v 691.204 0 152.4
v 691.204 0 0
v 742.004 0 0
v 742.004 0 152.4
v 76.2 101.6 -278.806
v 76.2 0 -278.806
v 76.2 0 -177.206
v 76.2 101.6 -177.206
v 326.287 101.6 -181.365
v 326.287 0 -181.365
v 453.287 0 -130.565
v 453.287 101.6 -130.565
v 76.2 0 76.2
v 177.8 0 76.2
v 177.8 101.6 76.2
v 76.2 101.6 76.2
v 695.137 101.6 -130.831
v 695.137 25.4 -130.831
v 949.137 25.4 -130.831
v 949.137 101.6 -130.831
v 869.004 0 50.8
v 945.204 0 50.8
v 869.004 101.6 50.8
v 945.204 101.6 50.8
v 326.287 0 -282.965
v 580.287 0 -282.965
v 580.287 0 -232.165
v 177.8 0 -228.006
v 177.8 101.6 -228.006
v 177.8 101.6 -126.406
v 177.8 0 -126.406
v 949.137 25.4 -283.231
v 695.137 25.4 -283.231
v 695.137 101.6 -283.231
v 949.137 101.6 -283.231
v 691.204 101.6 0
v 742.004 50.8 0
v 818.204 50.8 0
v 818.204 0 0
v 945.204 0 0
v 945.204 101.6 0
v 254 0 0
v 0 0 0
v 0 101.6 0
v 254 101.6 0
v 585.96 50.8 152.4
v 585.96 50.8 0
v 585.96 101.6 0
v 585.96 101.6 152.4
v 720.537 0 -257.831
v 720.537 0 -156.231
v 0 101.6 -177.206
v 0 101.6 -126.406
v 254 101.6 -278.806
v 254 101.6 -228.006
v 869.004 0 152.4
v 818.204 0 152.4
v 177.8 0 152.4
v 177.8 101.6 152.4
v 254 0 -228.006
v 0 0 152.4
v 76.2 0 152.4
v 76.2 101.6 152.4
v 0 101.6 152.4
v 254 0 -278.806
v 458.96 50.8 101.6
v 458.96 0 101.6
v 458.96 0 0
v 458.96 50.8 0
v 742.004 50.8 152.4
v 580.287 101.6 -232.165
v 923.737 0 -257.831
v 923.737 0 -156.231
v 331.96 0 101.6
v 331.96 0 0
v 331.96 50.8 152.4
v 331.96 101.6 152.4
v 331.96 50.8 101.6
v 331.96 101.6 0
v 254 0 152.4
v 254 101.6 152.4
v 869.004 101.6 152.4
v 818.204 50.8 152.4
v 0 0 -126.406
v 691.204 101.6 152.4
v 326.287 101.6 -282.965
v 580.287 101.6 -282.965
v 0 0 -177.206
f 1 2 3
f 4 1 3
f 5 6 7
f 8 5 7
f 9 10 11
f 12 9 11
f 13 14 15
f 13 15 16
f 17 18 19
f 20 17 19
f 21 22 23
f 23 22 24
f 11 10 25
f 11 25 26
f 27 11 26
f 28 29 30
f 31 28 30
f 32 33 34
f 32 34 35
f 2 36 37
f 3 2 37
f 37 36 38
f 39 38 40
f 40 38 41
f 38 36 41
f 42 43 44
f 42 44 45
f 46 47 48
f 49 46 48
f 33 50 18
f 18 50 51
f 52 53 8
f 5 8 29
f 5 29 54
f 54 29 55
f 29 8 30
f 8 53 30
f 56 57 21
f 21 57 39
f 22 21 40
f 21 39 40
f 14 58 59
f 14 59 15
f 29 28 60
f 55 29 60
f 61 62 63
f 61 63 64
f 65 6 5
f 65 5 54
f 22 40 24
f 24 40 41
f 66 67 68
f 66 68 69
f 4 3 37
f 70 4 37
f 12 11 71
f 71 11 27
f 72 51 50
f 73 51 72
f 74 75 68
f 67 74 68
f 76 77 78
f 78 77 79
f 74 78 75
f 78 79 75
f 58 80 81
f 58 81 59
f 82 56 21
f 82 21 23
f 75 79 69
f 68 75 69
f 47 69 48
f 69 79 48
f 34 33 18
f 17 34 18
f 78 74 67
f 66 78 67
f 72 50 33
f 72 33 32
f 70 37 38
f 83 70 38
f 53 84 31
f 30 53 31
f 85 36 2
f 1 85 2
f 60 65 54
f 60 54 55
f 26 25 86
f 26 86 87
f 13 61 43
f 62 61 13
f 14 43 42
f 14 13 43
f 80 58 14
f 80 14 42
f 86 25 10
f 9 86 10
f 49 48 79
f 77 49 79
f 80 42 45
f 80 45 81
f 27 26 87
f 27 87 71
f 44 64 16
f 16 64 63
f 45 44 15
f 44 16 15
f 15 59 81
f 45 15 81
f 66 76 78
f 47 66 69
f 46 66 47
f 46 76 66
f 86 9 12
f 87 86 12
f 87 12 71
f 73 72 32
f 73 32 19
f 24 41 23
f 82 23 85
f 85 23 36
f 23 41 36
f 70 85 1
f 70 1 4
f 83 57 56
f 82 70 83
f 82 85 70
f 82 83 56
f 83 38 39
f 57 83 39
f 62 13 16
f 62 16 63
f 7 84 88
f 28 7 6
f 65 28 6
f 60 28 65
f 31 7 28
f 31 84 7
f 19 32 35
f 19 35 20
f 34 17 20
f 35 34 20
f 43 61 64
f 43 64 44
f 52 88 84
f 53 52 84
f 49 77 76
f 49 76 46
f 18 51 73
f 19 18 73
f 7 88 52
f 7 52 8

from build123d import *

# Parameters (mm, degrees)
F1_DEPTH  = 101.6
F3_DEPTH  = 152.4
F5_DEPTH  = 152.4
F6_W      = 127
F6_H      = 50.8
F7_DEPTH  = 50.8
F8_W      = 101.6
F8_H      = 101.6
F9_DEPTH  = 76.2
F10_W     = 254
F10_H     = 152.4
F11_DEPTH = 101.6
F12_W     = 76.2
F12_H     = 101.6
F13_DEPTH = 101.6
F14_W     = 254
F14_H     = 152.4
F15_DEPTH = 101.6
F17_DEPTH = 101.6
F19_DEPTH = 101.6
F20_W     = 254
F20_H     = 152.4
F21_DEPTH = 101.6
F22_SIZE  = 25.4
F23_SIZE  = 25.4
F24_SIZE  = 25.4
F25_SIZE  = 25.4


with BuildPart() as f1:
    # F0 (on Front) → F1 (new body)
    with BuildSketch(Plane.XZ):
        Polygon((0, 152.4), (0, 0), (254, 0), (254, 152.4), (177.8, 152.4), (177.8, 76.2), (76.2, 76.2), (76.2, 152.4), align=None)
    extrude(amount=-F1_DEPTH)


with BuildPart() as f3:
    # F2 (on Top) → F3 (new body)
    with BuildSketch(Plane.XY):
        Polygon((331.959809, 101.6), (331.959809, 0), (458.959809, 0), (458.959809, 50.8), (585.959809, 50.8), (585.959809, 101.6), align=None)
    extrude(amount=F3_DEPTH)

    # F6 (on face) → F7 (cut)
    with BuildSketch(Plane.XZ):
        with Locations((395.459809, 127)):
            Rectangle(F6_W, F6_H)
    extrude(amount=-F7_DEPTH, mode=Mode.SUBTRACT)


with BuildPart() as f5:
    # F4 (on Top) → F5 (new body)
    with BuildSketch(Plane.XY):
        Polygon((691.204082, 101.6), (691.204082, 0), (742.004082, 0), (742.004082, 50.8), (818.204082, 50.8), (818.204082, 0), (945.204082, 0), (945.204082, 101.6), align=None)
    extrude(amount=F5_DEPTH)

    # F8 (on face) → F9 (cut)
    with BuildSketch(Plane.YZ.offset(945.204082)):
        with Locations((50.8, 101.6)):
            Rectangle(F8_W, F8_H)
    extrude(amount=-F9_DEPTH, mode=Mode.SUBTRACT)


with BuildPart() as f11:
    # F10 (on Front) → F11 (new body)
    with BuildSketch(Plane.XZ):
        with Locations((127, -202.606321)):
            Rectangle(F10_W, F10_H)
    extrude(amount=-F11_DEPTH)

    # F12 (on face) → F13 (cut)
    with BuildSketch(Plane.XZ):
        with Locations((38.1, -228.006321)):
            Rectangle(F12_W, F12_H)
        with Locations((215.9, -177.206321)):
            Rectangle(F12_W, F12_H)
    extrude(amount=-F13_DEPTH, mode=Mode.SUBTRACT)


with BuildPart() as f15:
    # F14 (on Front) → F15 (new body)
    with BuildSketch(Plane.XZ):
        with Locations((453.286525, -206.764647)):
            Rectangle(F14_W, F14_H)
    extrude(amount=-F15_DEPTH)

    # F16 (on face) → F17 (cut)
    with BuildSketch(Plane.XZ):
        Polygon((326.286525, -130.564647), (326.286525, -181.364647), (453.286525, -130.564647), align=None)
    extrude(amount=-F17_DEPTH, mode=Mode.SUBTRACT)

    # F18 (on face) → F19 (cut)
    with BuildSketch(Plane.XZ):
        Polygon((453.286525, -130.564647), (580.286525, -232.164647), (580.286525, -130.564647), align=None)
    extrude(amount=-F19_DEPTH, mode=Mode.SUBTRACT)


with BuildPart() as f21:
    # F20 (on Front) → F21 (new body)
    with BuildSketch(Plane.XZ):
        with Locations((822.136905, -207.031137)):
            Rectangle(F20_W, F20_H)
    extrude(amount=-F21_DEPTH)

    # F22
    f22_edges = [f21.edges().sort_by_distance(p)[0] for p in [
        (822.136905, 0, -130.831137),
    ]]
    chamfer(f22_edges, length=F22_SIZE)

    # F23
    f23_edges = [f21.edges().sort_by_distance(p)[0] for p in [
        (695.136905, 0, -219.731137),
    ]]
    chamfer(f23_edges, length=F23_SIZE)

    # F24
    f24_edges = [f21.edges().sort_by_distance(p)[0] for p in [
        (834.836905, 0, -283.231137),
    ]]
    chamfer(f24_edges, length=F24_SIZE)

    # F25
    f25_edges = [f21.edges().sort_by_distance(p)[0] for p in [
        (949.136905, 0, -207.031137),
    ]]
    chamfer(f25_edges, length=F25_SIZE)


solid = Compound([f1.part, f3.part, f5.part, f11.part, f15.part, f21.part])
